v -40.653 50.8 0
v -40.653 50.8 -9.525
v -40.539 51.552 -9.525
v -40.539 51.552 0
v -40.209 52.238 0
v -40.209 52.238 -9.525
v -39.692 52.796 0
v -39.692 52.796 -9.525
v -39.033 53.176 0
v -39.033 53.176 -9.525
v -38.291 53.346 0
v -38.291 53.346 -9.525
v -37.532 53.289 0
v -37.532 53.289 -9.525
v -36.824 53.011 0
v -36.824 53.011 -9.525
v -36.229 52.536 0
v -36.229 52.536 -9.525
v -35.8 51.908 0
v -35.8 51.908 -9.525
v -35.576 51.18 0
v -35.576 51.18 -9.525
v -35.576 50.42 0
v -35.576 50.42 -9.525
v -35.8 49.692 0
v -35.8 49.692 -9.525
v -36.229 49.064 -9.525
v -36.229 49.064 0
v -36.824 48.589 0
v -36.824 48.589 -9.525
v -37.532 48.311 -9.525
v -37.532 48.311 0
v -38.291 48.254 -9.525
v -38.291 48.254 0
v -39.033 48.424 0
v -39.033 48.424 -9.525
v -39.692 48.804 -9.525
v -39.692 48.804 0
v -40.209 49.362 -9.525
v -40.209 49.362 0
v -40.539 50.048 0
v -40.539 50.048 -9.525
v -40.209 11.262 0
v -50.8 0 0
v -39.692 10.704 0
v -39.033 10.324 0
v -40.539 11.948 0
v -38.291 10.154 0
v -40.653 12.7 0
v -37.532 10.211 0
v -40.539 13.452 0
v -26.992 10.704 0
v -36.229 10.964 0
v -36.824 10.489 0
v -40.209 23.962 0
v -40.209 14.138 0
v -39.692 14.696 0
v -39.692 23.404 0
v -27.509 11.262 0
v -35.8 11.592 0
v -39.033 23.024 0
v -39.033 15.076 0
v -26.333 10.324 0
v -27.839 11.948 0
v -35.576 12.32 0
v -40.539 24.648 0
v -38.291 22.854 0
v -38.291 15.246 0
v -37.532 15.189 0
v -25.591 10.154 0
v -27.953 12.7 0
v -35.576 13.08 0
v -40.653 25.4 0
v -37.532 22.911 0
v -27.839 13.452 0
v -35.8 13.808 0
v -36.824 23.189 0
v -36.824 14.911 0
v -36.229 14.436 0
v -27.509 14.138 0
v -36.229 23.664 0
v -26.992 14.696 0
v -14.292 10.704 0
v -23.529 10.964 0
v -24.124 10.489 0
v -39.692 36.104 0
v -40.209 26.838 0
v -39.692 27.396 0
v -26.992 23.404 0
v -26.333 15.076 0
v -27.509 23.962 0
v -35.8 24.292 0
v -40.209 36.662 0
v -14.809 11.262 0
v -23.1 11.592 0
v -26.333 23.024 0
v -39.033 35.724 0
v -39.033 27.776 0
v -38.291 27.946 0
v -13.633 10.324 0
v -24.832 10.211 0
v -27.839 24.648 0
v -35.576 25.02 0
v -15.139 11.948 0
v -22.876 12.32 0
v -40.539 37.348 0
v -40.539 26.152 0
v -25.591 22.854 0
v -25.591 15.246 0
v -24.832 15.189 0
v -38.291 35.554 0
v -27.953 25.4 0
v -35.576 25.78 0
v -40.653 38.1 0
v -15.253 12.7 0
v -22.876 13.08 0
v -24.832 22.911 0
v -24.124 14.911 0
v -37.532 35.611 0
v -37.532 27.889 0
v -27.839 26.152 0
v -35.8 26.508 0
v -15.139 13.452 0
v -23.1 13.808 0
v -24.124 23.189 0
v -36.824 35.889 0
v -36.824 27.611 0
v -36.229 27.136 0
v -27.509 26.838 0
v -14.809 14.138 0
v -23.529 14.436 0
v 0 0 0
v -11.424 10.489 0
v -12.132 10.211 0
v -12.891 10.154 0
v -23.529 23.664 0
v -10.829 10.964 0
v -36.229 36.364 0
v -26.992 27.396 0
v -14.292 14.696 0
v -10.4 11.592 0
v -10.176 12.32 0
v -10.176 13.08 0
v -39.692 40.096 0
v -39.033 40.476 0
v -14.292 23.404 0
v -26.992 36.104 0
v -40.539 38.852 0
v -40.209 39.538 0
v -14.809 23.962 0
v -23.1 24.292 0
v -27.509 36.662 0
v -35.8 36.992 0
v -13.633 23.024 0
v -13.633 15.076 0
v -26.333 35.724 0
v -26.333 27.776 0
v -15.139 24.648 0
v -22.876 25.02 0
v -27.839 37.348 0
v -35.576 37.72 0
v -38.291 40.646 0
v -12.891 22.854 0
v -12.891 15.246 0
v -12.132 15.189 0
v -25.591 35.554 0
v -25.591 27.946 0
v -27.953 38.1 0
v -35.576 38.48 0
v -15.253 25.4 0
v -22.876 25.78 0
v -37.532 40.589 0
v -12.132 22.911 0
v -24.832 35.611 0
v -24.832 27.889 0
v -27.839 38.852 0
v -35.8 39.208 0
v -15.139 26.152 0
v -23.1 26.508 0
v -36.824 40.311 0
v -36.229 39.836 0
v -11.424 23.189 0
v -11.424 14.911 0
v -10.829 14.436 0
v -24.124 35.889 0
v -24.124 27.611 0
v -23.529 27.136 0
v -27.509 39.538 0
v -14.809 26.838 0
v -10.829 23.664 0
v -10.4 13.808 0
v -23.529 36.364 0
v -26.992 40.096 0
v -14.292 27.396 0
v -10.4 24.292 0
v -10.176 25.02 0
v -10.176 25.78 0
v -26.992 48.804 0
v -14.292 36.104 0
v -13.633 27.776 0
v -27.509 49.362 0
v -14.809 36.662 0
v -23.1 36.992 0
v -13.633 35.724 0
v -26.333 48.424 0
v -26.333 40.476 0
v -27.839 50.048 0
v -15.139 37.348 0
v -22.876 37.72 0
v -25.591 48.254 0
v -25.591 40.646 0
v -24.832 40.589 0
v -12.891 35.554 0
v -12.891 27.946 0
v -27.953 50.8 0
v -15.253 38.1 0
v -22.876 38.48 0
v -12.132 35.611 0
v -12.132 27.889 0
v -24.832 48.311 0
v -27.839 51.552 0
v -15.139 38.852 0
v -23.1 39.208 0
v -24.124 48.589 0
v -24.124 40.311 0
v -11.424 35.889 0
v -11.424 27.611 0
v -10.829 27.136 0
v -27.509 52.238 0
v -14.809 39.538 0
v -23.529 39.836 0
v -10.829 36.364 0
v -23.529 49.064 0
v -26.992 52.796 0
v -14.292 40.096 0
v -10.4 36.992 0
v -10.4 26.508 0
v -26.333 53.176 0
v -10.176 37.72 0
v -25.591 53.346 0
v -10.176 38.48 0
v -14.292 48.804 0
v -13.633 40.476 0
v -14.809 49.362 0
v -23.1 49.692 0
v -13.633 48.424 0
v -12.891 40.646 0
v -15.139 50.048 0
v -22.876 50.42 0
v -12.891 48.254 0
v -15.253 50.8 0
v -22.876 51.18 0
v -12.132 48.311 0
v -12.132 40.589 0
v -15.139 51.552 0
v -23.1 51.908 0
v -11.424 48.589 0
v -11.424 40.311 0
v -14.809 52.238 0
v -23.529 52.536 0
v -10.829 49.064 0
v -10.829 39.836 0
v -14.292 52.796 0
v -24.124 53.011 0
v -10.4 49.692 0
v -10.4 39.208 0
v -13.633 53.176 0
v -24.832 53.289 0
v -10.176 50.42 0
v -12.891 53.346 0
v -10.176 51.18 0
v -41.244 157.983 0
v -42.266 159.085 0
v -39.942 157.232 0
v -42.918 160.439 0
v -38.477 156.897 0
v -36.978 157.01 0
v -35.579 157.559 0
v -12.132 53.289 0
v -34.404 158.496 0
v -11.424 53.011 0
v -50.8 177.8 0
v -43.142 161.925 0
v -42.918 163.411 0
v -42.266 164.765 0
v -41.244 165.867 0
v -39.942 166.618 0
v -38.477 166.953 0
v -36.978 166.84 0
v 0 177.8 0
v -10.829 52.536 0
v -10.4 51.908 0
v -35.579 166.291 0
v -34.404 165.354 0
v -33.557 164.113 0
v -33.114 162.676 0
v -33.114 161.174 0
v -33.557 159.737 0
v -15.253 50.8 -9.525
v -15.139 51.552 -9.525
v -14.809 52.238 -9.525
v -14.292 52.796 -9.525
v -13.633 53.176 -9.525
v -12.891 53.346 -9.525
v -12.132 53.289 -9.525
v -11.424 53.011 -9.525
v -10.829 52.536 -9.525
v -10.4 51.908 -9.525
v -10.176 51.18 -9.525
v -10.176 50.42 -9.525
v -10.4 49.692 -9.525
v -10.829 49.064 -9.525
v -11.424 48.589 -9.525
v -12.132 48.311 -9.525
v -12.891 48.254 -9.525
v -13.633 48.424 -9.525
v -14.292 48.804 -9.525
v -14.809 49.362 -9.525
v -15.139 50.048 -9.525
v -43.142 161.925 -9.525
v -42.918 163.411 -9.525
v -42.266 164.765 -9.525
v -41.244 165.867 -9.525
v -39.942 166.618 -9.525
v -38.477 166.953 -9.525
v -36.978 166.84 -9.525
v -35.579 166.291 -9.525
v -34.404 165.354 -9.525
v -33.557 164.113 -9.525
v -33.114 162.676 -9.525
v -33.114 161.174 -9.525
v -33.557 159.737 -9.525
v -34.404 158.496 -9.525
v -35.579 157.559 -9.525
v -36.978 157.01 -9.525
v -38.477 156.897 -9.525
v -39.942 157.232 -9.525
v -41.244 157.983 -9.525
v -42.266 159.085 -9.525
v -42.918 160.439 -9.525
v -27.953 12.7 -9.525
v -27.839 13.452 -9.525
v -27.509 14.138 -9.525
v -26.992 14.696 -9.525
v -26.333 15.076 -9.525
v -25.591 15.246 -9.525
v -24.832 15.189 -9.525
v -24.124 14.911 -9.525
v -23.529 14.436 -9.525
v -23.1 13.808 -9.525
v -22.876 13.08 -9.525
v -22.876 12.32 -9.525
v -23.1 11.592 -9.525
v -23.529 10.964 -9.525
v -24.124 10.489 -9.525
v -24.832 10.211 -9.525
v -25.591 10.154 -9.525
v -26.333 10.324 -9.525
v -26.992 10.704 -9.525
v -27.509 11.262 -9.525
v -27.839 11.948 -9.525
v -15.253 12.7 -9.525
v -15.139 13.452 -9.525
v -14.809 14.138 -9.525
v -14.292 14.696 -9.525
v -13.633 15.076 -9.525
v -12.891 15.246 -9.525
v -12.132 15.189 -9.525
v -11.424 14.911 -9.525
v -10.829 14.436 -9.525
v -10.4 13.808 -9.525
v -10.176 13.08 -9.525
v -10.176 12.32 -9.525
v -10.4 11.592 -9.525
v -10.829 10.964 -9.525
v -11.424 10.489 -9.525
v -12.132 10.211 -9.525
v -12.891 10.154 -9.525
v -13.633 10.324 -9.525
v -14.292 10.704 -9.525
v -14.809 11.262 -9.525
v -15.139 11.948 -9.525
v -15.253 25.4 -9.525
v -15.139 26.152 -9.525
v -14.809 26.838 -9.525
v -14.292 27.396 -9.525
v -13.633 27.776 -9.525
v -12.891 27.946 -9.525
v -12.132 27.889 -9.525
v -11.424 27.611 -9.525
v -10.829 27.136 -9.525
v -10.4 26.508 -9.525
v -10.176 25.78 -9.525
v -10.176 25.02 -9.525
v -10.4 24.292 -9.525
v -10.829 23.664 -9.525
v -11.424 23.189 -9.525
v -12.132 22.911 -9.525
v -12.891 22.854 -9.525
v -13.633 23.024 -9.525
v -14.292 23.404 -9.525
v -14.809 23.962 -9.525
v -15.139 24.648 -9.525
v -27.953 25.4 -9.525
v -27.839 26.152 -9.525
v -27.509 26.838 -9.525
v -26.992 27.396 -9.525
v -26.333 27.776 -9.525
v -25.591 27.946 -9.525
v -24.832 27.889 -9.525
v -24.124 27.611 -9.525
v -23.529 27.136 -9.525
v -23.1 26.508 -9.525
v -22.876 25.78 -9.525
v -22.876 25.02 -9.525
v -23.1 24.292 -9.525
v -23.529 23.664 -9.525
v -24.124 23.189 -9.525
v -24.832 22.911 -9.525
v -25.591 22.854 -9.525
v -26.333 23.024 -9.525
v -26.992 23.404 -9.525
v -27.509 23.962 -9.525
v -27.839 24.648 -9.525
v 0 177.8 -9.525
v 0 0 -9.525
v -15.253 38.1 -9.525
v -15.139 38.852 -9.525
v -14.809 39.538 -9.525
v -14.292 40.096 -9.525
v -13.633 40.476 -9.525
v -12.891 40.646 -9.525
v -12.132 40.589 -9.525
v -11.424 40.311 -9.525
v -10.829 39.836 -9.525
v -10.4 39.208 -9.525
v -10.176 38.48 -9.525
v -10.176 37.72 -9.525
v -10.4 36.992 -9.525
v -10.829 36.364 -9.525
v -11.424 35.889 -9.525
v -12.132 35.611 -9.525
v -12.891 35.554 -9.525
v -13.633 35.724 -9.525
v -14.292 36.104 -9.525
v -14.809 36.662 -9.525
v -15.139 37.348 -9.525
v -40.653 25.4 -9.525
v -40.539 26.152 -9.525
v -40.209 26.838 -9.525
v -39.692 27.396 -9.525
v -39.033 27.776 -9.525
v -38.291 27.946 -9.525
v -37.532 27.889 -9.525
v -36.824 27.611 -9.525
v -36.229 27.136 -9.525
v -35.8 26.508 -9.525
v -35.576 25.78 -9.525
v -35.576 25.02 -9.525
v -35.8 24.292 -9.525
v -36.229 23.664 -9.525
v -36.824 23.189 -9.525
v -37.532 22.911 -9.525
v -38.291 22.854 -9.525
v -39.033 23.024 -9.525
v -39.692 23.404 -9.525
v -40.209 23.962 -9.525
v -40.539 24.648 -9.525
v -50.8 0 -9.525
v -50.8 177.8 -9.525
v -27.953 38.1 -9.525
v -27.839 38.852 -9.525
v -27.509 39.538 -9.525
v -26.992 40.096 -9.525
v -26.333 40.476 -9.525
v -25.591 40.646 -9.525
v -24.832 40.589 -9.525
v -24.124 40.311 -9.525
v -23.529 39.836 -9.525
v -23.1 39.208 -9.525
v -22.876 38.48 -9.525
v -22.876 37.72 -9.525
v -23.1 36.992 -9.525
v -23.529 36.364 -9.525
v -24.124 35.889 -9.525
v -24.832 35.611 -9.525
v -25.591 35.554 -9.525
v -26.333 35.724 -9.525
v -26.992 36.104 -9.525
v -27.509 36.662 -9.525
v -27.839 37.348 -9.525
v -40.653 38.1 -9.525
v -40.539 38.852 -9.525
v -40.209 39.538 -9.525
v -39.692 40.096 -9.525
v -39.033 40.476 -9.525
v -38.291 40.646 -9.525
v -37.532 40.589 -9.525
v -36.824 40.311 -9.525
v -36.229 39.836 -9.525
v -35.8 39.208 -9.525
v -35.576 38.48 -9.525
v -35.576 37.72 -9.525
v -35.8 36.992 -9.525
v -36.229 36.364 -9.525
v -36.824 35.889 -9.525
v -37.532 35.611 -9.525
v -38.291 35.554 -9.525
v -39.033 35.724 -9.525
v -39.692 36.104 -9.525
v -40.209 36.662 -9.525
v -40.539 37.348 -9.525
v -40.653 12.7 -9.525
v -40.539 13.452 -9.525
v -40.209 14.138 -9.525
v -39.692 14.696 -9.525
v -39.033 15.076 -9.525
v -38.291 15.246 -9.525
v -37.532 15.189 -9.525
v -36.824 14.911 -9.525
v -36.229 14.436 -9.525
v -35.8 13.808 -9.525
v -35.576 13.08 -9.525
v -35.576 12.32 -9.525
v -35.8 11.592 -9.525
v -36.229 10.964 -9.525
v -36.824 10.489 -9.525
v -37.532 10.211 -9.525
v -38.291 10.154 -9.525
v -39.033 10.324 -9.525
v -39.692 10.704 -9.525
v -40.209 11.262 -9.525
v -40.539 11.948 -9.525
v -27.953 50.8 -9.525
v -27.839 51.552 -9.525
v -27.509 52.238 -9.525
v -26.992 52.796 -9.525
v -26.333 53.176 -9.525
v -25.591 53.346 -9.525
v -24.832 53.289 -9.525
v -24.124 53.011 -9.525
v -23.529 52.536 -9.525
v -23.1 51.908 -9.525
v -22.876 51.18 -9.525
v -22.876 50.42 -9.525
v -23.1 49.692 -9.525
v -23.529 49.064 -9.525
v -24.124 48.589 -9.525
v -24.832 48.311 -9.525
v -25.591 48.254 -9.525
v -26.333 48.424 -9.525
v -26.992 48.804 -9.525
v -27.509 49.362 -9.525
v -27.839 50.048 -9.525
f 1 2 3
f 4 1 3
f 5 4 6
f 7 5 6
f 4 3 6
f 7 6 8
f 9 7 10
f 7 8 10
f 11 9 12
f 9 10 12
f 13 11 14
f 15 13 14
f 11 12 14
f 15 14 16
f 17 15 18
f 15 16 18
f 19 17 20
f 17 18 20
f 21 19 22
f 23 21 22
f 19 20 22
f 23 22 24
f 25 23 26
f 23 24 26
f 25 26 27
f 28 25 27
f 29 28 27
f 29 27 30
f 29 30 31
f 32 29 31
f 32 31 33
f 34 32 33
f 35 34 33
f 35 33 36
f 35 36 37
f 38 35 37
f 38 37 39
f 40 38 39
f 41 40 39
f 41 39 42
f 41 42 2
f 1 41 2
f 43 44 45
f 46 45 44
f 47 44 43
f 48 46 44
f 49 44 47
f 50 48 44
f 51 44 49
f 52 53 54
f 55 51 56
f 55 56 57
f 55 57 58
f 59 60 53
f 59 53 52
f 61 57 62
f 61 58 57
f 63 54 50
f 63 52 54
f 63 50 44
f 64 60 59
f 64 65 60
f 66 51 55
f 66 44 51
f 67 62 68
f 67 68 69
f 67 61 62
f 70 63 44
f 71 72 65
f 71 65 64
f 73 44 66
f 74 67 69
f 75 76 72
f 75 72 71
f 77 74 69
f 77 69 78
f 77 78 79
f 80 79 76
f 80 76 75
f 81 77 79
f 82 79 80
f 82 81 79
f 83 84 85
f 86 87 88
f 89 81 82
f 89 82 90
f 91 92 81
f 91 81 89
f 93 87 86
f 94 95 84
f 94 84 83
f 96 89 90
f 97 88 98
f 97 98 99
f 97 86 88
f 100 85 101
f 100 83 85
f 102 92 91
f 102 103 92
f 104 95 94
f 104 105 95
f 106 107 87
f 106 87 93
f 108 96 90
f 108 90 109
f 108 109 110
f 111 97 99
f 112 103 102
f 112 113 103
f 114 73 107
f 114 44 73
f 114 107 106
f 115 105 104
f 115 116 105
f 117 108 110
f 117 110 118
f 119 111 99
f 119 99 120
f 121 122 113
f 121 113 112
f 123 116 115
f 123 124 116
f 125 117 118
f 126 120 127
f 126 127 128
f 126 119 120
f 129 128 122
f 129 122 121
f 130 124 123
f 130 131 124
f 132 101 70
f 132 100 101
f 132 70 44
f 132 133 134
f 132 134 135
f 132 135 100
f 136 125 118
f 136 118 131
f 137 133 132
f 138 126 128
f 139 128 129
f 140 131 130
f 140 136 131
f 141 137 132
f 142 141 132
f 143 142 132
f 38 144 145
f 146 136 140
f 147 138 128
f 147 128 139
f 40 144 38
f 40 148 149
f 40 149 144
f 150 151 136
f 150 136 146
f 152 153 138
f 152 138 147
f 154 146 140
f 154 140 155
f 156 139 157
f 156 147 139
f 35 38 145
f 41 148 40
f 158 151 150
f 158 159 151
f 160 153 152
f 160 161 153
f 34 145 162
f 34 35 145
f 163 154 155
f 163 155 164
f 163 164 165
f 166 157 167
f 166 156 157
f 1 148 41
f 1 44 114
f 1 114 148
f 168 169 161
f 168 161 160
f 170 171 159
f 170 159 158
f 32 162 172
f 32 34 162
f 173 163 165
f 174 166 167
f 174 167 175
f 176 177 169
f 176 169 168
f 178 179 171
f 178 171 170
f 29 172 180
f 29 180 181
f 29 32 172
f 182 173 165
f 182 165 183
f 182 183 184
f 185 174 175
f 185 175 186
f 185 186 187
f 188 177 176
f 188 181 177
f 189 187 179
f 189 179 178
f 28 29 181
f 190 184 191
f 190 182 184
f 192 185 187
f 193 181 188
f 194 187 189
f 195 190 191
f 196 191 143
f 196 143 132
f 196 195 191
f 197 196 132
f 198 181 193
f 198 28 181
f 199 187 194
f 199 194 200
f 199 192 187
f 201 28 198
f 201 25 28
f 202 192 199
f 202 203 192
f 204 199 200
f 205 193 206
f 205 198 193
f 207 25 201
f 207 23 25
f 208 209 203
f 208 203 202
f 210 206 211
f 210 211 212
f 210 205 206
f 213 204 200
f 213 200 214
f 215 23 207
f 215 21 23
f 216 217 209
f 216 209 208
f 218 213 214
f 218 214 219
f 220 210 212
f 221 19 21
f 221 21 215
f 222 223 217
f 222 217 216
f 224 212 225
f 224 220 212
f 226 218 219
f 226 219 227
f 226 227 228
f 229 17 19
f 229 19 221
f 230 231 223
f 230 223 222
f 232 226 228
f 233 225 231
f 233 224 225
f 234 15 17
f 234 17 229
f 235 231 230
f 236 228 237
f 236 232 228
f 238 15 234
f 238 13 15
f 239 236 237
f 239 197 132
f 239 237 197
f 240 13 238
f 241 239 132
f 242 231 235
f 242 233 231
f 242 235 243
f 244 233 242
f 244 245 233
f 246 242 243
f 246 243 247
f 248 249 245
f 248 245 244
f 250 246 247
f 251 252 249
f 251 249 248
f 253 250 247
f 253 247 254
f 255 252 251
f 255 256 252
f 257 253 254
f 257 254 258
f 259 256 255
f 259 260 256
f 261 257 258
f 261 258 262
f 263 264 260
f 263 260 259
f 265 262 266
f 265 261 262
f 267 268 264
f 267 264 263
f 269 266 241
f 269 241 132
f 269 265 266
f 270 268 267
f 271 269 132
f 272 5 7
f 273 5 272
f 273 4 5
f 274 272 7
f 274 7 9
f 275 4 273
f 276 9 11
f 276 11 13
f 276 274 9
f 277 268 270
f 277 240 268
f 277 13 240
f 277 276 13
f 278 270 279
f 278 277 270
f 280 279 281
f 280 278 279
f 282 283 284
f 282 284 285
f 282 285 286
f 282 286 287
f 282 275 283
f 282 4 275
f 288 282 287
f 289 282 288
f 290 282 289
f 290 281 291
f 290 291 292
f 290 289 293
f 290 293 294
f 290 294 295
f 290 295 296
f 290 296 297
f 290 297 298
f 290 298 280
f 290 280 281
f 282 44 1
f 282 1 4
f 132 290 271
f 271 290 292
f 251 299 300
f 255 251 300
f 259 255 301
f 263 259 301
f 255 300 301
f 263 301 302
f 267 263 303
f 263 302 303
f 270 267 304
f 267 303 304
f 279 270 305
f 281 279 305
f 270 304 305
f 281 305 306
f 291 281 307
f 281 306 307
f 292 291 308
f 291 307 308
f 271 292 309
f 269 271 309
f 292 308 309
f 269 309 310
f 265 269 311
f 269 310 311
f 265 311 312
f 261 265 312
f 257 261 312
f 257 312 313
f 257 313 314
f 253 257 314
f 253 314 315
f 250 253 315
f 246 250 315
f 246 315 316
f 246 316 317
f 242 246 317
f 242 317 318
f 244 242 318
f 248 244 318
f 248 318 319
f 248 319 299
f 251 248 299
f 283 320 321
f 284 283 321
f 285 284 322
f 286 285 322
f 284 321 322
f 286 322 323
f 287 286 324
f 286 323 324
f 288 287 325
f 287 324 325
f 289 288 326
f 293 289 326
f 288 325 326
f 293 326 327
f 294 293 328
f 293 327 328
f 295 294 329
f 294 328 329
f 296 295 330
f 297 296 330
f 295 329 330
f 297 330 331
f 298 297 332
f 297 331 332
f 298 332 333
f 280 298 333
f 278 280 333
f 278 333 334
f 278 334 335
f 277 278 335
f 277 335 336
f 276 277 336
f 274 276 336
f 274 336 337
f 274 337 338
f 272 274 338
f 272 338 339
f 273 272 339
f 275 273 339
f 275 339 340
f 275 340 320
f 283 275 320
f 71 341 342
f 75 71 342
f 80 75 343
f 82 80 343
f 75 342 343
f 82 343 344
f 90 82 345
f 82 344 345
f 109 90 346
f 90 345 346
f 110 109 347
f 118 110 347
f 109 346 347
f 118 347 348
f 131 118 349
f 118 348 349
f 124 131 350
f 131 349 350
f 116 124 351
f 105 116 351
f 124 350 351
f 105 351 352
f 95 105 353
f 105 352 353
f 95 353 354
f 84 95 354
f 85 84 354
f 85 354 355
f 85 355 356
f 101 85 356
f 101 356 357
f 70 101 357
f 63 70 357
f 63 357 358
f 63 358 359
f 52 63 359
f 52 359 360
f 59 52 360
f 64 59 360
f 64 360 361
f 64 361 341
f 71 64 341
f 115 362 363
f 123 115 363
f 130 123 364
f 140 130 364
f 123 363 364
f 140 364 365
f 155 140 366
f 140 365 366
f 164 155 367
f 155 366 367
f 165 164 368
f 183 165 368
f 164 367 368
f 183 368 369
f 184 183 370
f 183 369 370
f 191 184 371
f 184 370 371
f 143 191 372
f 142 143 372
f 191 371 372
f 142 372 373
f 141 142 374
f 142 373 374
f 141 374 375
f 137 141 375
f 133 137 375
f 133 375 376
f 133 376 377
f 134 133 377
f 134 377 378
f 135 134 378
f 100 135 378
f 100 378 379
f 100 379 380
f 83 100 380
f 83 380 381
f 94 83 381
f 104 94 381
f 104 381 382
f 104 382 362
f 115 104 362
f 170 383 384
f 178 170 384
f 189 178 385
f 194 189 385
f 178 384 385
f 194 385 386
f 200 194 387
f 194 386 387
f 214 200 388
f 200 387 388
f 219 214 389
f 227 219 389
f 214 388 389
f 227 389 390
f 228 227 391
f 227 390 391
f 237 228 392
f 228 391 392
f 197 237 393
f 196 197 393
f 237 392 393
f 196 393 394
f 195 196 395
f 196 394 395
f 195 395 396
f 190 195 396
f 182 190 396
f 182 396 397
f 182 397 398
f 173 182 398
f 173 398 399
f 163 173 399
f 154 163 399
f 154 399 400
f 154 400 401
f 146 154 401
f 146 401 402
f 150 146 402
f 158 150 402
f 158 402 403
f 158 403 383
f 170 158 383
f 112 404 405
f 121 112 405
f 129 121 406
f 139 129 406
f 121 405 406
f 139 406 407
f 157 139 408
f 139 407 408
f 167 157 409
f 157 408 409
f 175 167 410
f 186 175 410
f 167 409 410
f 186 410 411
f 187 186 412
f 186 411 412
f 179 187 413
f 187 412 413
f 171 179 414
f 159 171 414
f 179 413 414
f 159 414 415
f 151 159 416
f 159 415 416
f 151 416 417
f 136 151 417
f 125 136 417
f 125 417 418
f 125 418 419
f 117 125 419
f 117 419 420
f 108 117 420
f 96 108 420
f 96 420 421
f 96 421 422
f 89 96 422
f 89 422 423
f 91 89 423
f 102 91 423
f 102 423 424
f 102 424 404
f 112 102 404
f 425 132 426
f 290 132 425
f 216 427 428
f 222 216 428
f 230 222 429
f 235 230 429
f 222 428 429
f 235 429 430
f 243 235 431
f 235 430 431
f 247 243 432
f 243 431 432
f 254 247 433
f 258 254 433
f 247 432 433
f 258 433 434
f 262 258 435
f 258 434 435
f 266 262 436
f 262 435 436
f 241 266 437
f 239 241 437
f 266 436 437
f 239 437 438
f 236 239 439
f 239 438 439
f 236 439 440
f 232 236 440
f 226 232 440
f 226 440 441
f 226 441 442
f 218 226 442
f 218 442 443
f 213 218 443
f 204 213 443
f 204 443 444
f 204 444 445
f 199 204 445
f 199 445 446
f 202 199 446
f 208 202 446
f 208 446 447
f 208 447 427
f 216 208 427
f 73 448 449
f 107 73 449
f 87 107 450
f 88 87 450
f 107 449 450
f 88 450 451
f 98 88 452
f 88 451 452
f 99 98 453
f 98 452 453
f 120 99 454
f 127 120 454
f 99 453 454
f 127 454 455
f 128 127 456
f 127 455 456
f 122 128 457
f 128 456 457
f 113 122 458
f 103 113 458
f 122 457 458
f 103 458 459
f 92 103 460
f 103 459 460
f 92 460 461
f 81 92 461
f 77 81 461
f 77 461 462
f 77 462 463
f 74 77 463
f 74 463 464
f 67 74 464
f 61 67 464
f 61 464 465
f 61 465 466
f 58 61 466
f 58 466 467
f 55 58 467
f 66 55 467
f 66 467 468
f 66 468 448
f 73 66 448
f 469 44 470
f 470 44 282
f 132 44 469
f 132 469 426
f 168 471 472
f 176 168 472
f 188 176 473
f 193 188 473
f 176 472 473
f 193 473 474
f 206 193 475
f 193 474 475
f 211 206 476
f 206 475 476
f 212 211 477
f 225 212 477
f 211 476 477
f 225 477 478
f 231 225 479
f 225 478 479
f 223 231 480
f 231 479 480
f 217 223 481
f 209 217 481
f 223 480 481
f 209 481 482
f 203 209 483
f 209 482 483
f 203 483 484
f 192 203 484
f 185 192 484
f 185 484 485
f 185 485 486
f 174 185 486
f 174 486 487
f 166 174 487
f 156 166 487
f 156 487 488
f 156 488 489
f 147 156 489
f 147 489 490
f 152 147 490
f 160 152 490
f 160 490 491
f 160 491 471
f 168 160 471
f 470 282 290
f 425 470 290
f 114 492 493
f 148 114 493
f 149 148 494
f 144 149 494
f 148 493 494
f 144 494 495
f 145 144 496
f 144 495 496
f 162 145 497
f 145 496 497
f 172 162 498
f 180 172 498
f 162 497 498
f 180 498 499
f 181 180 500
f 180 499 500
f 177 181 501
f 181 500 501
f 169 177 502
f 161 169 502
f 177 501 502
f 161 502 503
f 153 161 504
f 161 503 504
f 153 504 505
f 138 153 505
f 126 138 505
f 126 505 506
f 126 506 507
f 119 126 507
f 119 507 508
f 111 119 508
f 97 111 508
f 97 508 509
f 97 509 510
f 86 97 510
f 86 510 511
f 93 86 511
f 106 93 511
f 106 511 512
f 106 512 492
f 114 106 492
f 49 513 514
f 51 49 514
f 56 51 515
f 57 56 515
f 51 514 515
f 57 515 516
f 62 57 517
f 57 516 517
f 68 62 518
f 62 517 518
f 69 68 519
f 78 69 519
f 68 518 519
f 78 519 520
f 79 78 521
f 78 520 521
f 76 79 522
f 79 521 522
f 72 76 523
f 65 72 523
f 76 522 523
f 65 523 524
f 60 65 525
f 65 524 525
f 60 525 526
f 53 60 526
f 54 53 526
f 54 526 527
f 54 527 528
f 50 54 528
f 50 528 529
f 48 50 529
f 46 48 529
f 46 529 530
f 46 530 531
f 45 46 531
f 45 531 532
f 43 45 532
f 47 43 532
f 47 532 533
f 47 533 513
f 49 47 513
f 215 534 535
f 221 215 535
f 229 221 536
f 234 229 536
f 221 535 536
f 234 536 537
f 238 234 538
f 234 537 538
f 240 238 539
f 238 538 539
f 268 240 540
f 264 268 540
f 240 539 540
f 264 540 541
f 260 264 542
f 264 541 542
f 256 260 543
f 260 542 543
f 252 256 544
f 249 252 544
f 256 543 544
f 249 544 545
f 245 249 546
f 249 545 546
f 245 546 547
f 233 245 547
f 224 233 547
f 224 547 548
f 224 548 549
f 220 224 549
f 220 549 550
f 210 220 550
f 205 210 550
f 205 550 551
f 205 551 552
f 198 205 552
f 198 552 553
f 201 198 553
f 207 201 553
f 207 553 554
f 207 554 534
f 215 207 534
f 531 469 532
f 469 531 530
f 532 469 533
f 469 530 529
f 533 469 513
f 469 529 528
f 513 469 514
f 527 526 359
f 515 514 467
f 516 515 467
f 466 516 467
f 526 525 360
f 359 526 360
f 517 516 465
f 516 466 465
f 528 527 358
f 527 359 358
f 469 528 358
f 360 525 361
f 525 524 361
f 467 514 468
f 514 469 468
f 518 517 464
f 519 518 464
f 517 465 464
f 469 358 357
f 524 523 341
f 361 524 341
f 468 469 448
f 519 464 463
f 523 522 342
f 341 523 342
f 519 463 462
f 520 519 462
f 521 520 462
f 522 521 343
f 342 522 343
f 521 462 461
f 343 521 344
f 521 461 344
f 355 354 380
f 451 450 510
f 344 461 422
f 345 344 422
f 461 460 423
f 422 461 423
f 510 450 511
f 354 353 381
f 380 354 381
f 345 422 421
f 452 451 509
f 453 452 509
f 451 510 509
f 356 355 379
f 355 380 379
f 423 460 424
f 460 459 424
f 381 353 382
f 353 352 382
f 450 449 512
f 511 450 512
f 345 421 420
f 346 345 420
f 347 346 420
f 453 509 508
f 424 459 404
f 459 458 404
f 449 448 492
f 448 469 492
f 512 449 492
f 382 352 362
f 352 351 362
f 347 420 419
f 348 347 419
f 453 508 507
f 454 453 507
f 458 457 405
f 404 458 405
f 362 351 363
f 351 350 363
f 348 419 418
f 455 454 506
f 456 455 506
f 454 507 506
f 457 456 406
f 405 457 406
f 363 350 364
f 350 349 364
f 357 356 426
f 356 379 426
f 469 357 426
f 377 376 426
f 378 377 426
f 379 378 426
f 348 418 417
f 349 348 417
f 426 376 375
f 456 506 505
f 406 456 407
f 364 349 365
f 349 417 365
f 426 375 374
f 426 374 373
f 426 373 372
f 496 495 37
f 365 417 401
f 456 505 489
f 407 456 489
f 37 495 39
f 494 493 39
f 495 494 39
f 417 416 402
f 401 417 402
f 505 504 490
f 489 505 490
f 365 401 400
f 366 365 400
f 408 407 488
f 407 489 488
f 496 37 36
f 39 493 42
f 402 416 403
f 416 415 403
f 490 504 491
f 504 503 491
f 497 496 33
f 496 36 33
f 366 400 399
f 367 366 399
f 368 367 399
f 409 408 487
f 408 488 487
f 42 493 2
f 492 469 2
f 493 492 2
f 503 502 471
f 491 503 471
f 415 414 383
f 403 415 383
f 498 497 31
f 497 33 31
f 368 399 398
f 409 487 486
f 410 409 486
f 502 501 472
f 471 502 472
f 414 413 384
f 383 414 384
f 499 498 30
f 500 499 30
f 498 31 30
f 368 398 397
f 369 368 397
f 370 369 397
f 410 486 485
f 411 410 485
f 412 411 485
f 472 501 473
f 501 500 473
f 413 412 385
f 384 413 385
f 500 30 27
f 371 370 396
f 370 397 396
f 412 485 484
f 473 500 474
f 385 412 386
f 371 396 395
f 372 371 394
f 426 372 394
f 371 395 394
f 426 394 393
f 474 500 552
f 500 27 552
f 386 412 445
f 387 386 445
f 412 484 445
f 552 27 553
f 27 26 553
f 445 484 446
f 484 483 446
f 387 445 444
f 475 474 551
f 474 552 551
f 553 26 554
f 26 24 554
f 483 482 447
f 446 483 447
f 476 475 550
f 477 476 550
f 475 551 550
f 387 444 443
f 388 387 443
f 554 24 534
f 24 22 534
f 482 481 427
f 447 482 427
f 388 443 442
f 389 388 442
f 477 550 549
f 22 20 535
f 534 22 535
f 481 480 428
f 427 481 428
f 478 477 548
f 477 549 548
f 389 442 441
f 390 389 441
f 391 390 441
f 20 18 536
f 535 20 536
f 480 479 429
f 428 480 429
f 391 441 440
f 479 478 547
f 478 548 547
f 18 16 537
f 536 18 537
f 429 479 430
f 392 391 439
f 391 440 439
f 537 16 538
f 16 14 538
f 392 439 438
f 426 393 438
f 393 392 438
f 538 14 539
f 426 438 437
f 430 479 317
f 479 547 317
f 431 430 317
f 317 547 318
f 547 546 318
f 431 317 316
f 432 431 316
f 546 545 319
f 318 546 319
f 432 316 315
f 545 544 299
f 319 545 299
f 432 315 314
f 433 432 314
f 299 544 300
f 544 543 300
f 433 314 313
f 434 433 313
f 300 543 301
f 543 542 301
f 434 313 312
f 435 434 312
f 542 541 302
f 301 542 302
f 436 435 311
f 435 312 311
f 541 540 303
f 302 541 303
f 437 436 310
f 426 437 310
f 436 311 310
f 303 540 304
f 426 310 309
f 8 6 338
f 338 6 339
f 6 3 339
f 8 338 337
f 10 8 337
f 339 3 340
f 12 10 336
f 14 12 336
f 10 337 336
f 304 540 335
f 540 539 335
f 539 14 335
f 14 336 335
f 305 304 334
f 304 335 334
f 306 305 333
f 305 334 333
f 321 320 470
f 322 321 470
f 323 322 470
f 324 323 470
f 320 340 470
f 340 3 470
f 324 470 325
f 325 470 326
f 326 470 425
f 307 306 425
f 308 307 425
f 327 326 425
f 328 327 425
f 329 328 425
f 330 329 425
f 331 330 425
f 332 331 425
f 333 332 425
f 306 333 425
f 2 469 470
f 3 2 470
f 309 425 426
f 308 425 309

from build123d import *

# Parameters (mm, degrees)
F0_W     = 50.8
F0_H     = 177.8
F1_DEPTH = 9.525
F2_D     = 5.1054
F3_D     = 10.0838


# Not quite as in the source:
# - a length typed as a fraction of an inch, garbled in the dataset ("3 / 203.2 mm" for 3/8 in), is restored


with BuildPart() as f1:
    # F0 (on Top) → F1 (new body)
    with BuildSketch(Plane.XY):
        with Locations((-25.4, 88.9)):
            Rectangle(F0_W, F0_H)
    extrude(amount=-F1_DEPTH)

    # F2 (through all)
    with Locations(Plane.XY):
        with Locations((-12.7, 12.7), (-25.4, 12.7), (-38.1, 12.7), (-38.1, 25.4), (-25.4, 25.4), (-12.7, 25.4), (-12.7, 38.1), (-25.4, 38.1), (-38.1, 38.1), (-38.1, 50.8), (-25.4, 50.8), (-12.7, 50.8)):
            Hole(F2_D / 2)

    # F3 (through all)
    with Locations(Plane.XY):
        with Locations((-38.1, 161.925)):
            Hole(F3_D / 2)


solid = f1.part
